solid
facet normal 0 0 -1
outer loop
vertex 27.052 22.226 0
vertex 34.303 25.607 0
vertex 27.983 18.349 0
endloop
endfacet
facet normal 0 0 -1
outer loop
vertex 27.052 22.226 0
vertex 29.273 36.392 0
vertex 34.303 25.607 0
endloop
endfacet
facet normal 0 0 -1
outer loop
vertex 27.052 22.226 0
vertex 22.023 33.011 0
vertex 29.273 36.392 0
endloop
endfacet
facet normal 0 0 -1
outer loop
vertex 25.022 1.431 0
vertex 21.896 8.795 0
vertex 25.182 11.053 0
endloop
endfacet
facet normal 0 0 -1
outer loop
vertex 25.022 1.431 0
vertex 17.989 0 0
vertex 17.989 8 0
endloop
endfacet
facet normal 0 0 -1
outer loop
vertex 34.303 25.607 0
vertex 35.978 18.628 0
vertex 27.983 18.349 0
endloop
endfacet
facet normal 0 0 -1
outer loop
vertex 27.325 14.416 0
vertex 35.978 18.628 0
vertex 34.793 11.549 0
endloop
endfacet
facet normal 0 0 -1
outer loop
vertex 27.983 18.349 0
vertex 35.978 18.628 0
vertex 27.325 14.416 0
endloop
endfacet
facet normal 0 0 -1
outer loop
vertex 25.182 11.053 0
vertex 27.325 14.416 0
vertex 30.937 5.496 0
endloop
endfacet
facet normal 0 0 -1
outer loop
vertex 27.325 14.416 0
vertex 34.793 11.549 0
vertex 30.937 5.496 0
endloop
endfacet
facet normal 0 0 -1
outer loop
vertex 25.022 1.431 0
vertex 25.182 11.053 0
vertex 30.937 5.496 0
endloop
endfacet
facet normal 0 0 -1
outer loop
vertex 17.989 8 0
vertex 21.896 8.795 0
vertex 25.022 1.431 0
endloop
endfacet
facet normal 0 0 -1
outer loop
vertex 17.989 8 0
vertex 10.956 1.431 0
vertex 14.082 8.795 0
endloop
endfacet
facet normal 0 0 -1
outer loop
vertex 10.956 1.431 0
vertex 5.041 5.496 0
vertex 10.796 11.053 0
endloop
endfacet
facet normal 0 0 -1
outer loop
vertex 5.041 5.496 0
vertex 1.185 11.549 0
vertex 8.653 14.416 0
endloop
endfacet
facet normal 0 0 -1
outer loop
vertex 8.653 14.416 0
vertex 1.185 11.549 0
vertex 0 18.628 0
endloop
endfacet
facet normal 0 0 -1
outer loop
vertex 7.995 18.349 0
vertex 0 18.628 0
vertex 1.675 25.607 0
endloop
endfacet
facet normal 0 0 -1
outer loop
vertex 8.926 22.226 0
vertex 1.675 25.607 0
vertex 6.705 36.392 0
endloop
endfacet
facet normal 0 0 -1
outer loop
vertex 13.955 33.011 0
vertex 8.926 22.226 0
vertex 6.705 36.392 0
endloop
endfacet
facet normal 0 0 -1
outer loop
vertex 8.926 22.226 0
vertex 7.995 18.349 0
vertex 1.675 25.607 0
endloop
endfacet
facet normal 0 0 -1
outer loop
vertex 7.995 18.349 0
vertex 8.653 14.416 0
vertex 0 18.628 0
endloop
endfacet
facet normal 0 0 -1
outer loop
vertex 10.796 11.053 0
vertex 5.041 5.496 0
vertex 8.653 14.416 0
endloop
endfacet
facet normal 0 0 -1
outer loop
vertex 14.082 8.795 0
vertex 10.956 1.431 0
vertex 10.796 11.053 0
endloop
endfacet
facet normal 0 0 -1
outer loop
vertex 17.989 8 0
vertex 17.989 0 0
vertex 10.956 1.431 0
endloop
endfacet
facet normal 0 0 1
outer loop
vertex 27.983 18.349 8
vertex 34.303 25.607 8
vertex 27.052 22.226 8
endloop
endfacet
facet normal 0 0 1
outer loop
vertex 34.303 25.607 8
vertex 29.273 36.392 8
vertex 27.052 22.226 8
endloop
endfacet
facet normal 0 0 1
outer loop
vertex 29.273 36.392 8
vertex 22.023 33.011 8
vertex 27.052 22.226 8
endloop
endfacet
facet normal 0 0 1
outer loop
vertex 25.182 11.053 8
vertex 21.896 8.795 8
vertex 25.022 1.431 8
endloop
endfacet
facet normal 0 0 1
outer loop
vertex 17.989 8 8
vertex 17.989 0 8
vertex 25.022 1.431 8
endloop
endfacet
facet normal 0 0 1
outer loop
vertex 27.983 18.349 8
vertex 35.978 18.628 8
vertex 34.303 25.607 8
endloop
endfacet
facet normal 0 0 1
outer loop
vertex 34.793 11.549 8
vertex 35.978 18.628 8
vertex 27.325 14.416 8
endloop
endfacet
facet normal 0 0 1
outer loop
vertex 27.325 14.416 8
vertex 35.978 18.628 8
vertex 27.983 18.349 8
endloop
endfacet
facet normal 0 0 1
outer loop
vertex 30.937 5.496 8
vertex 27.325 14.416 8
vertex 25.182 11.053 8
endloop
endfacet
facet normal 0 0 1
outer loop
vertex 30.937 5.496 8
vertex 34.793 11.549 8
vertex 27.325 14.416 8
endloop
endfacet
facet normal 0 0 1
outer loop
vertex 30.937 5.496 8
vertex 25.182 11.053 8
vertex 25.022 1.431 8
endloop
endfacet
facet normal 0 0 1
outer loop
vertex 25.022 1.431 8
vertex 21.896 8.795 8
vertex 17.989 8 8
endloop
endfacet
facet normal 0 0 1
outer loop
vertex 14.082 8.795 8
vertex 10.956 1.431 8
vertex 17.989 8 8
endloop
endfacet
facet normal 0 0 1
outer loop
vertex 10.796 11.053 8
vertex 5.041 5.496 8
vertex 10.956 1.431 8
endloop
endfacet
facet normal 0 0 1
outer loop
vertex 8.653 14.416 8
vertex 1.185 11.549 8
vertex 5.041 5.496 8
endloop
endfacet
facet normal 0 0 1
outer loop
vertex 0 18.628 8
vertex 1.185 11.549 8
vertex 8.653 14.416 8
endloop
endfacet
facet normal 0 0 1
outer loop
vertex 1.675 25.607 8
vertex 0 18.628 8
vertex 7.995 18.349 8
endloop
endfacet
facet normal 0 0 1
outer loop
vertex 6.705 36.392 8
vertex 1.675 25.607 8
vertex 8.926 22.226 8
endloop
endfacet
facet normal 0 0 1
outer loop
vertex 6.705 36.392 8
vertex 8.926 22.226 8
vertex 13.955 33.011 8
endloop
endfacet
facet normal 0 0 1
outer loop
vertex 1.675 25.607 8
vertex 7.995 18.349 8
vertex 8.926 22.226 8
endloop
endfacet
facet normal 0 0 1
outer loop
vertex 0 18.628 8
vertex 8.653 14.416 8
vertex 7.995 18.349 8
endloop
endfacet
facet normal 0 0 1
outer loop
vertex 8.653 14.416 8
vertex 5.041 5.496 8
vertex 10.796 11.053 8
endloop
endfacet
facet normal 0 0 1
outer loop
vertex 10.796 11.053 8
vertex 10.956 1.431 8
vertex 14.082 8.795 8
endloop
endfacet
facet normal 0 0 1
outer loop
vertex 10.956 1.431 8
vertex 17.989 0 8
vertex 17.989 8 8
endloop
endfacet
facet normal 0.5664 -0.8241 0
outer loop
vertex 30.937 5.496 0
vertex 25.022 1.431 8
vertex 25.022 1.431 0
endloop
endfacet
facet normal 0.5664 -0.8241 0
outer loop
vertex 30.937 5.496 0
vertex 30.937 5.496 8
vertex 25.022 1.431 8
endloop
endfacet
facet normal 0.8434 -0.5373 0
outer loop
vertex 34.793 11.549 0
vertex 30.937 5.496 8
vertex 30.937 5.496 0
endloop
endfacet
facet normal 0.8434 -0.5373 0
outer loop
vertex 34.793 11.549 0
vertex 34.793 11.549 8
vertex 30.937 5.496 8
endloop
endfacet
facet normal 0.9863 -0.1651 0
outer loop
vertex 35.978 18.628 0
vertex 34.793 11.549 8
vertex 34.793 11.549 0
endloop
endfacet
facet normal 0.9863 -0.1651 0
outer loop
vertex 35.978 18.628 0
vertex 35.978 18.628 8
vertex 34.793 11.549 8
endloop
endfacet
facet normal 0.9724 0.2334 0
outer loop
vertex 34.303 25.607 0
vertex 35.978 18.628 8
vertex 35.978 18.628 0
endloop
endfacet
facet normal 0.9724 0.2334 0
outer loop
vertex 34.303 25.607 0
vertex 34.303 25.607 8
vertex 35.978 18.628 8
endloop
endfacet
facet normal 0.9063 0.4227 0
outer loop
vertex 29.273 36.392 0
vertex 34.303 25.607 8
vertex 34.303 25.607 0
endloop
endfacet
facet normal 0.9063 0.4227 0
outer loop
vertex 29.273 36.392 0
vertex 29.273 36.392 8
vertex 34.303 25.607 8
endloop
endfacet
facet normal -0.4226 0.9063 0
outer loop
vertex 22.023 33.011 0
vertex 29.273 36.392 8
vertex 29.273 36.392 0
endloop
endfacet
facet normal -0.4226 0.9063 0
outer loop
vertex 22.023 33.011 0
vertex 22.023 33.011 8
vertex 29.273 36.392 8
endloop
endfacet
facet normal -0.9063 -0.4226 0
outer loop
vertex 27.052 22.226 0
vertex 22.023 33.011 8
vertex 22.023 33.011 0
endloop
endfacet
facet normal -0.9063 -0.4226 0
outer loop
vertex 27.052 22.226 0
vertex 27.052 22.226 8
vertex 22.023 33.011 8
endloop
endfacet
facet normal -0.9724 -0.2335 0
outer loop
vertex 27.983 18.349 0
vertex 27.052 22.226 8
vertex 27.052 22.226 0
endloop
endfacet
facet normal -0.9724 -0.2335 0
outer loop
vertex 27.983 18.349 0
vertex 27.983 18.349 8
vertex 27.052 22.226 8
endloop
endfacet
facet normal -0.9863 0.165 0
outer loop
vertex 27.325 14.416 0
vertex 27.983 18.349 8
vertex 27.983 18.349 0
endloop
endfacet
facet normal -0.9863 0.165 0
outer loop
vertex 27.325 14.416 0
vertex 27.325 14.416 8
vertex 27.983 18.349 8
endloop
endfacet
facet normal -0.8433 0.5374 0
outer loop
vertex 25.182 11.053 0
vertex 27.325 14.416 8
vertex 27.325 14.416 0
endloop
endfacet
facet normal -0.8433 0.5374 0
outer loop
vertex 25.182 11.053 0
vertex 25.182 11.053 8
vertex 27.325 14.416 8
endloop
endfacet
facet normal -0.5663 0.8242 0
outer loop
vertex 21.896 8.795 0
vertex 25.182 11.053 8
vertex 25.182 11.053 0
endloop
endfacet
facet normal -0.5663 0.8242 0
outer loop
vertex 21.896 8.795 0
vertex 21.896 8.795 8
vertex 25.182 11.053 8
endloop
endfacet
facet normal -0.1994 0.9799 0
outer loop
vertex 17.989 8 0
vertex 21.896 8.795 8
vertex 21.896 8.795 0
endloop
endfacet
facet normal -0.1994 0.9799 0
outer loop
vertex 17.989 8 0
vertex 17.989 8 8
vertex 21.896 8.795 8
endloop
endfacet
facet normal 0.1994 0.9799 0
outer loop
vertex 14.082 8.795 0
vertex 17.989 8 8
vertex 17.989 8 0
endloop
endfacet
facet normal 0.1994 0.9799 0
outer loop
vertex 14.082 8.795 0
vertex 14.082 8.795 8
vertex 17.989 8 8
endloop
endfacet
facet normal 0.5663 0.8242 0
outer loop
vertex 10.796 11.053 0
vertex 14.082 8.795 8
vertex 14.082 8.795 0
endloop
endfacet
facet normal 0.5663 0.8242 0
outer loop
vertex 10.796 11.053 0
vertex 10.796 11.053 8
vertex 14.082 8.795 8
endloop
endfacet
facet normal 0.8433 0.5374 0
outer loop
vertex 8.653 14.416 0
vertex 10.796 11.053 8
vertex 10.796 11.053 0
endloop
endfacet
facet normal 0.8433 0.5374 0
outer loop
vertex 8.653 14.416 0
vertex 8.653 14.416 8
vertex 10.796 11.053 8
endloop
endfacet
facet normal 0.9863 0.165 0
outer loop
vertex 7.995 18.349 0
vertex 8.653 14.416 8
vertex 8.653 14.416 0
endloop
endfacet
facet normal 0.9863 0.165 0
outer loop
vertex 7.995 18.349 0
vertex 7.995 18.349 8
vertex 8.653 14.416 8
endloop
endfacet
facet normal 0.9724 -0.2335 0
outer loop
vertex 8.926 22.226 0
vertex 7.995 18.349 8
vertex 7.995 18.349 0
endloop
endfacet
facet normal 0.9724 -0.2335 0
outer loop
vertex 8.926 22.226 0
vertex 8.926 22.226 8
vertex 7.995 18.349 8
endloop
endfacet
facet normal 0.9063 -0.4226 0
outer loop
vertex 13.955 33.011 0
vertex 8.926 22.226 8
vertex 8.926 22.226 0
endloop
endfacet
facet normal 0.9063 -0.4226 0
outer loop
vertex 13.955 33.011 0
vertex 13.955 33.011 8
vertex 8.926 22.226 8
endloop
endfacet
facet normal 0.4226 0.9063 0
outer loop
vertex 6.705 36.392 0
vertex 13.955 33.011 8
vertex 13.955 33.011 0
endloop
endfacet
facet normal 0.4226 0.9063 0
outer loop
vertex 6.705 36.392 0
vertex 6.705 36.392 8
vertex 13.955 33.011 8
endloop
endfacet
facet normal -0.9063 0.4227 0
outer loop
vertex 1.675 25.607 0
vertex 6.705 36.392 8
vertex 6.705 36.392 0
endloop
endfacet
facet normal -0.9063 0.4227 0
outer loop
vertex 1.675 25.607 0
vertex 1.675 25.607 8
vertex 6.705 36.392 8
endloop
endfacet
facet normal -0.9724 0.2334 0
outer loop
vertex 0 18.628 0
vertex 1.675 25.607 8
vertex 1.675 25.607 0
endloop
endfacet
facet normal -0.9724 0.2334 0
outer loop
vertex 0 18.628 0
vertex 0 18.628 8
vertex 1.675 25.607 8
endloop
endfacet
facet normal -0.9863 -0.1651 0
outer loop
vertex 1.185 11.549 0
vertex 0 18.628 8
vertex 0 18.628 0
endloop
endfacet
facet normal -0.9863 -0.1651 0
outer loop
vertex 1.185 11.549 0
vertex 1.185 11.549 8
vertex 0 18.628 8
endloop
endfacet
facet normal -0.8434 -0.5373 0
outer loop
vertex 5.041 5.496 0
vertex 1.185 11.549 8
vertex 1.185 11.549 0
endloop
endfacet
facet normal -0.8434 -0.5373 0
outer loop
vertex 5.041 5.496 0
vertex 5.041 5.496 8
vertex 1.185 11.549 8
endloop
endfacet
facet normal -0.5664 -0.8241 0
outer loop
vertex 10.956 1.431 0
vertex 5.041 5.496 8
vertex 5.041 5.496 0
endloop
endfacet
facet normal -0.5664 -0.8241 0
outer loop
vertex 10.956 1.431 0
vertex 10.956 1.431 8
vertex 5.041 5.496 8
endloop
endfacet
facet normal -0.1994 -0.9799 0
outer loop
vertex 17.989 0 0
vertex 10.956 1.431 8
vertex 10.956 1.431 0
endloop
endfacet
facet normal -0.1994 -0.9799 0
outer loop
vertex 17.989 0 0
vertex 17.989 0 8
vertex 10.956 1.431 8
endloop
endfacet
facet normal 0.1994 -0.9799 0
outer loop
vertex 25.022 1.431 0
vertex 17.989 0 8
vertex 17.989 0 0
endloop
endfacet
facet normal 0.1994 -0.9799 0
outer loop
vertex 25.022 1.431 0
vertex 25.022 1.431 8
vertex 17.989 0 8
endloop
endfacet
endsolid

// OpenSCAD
$fn = 32;

// ----------------------------------------------------------------------
// Clip blank: omega clip, 8 mm thick
// ----------------------------------------------------------------------

// --- parameters (mm) ---
profile_height = 8;       // extrusion height
profile_points = 26;      // points of the closed outline

profile = [[1.675, 25.607], [0, 18.628], [1.185, 11.549], [5.041, 5.496], [10.956, 1.431], [17.989, 0], [25.022, 1.431], [30.937, 5.496], [34.793, 11.549], [35.978, 18.628], [34.303, 25.607], [29.273, 36.392], [22.023, 33.011], [27.052, 22.226], [27.983, 18.349], [27.325, 14.416], [25.182, 11.053], [21.896, 8.795], [17.989, 8], [14.082, 8.795], [10.796, 11.053], [8.653, 14.416], [7.995, 18.349], [8.926, 22.226], [13.955, 33.011], [6.705, 36.392]];  // single closed polygon, 26 points, counter clockwise

// --- the one profile operation ---
linear_extrude(height = profile_height) polygon(points = profile);
